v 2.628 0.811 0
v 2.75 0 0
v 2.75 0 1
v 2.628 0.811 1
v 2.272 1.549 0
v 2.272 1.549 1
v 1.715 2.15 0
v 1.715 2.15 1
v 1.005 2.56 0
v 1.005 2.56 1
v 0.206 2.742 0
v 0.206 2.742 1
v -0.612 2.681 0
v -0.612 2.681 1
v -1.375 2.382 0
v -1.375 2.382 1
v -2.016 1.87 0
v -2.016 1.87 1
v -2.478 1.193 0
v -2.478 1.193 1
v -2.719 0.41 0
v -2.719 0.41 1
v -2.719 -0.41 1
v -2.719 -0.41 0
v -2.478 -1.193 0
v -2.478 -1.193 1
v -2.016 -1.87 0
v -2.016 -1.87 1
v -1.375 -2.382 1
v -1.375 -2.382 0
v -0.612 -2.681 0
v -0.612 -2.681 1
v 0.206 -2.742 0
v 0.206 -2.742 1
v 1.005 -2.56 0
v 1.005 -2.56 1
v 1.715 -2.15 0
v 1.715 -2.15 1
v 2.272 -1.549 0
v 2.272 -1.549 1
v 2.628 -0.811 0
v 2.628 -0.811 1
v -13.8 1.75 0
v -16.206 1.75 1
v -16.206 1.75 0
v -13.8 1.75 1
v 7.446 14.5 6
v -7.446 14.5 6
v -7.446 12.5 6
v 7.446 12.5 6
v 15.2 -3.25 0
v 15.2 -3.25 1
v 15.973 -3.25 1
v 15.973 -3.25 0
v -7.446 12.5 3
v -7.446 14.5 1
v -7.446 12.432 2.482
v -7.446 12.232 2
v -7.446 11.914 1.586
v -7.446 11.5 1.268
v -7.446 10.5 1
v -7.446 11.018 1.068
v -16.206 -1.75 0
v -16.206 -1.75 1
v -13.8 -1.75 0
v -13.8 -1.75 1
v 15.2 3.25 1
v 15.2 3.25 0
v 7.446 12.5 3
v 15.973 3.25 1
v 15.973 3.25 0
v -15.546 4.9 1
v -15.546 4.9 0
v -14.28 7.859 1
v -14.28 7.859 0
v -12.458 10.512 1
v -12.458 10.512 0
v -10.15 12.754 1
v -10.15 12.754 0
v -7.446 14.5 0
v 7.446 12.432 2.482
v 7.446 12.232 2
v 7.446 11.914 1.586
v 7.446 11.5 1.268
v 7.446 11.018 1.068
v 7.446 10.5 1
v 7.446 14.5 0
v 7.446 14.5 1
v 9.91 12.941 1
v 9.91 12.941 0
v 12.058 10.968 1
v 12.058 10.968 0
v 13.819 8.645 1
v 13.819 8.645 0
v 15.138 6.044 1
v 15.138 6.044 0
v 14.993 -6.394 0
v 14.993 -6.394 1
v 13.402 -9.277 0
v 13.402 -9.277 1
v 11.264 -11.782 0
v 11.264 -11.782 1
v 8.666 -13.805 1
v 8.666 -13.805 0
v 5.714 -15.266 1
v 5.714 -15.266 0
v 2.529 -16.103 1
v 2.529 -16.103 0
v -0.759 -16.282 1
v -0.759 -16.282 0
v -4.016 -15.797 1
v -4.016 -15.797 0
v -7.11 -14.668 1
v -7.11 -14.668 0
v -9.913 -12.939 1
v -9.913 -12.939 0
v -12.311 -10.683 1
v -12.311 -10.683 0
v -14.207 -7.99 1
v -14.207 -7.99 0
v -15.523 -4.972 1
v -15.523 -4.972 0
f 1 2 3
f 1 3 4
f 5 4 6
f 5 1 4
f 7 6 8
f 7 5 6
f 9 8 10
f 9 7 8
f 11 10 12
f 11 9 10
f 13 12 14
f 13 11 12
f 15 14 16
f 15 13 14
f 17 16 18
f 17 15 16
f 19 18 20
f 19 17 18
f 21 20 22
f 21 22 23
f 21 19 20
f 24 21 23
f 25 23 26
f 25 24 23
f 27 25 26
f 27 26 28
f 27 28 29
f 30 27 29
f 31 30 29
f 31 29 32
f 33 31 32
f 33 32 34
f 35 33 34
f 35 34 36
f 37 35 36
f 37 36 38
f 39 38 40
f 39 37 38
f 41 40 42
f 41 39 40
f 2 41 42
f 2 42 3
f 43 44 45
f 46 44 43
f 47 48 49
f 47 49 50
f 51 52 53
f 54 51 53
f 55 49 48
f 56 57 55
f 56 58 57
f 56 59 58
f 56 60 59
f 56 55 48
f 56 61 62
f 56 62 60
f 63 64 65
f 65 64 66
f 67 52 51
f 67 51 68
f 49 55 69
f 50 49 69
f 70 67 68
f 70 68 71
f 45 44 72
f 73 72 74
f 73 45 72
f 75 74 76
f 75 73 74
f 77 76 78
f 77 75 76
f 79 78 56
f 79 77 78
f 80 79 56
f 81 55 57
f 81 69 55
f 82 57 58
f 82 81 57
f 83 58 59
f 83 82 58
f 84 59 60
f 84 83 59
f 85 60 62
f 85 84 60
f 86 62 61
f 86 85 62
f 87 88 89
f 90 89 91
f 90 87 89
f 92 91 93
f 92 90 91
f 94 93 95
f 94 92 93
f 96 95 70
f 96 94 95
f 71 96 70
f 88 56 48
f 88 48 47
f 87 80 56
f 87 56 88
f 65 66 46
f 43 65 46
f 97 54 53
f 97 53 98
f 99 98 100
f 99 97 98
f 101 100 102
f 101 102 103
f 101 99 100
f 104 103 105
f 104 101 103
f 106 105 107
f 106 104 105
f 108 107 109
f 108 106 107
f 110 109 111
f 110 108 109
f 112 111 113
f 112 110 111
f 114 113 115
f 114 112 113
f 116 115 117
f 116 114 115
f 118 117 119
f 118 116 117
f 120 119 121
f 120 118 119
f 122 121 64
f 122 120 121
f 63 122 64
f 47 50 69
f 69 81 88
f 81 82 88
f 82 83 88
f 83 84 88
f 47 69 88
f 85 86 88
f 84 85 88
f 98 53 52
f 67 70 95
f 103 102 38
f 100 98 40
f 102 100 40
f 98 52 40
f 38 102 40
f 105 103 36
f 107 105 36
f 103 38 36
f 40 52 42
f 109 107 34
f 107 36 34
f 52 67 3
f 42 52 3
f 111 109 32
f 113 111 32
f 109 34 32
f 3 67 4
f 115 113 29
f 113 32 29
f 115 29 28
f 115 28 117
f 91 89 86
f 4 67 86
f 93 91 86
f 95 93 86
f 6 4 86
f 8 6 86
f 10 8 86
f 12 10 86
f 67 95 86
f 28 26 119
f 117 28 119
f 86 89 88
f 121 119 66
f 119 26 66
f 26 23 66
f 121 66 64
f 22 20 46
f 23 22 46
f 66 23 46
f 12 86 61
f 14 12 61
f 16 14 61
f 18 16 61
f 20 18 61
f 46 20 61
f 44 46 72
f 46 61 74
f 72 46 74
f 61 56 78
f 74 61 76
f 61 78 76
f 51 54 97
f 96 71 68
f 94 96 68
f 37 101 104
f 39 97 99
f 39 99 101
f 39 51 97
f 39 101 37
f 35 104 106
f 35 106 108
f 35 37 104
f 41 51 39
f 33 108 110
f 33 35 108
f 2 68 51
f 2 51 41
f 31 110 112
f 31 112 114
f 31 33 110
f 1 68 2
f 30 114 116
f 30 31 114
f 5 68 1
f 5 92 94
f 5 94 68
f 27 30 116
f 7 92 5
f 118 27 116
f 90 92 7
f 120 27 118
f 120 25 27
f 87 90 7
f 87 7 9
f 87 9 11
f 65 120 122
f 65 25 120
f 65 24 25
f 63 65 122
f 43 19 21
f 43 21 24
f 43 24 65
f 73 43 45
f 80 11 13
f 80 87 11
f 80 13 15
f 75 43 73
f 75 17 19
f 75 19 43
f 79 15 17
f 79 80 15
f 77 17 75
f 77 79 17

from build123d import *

# Parameters (mm, degrees)
SKETCH_1_R          = 2.75
EXTRUDE_1_DEPTH     = 1
SKETCH_2_W          = 5
SKETCH_2_H          = 3.5
SKETCH_2_W_2        = 2
SKETCH_2_H_2        = 6.5
CUT_EXTRUDE_1_DEPTH = 2
SKETCH_3_W          = 14.891608376
SKETCH_3_H          = 2
EXTRUDE_2_DEPTH     = 5
FILLET_1_R          = 2


with BuildPart() as part:
    # 草图1 → 凸台-拉伸1 (new body)
    with BuildSketch(Plane.XY):
        with BuildLine():
            Line((-7.445804188, 14.5), (7.445804188, 14.5))
            ThreePointArc((7.445804188, 14.5), (0, -16.3), (-7.445804188, 14.5))
        make_face()
        Circle(SKETCH_1_R, mode=Mode.SUBTRACT)
    extrude(amount=EXTRUDE_1_DEPTH)

    # 草图2 → 切除-拉伸1 (cut, through all)
    with BuildSketch(Plane.XY.offset(1)):
        with Locations((-16.3, 0)):
            Rectangle(SKETCH_2_W, SKETCH_2_H)
        with Locations((16.2, 0)):
            Rectangle(SKETCH_2_W_2, SKETCH_2_H_2)
    extrude(amount=-CUT_EXTRUDE_1_DEPTH, mode=Mode.SUBTRACT)

    # 草图3 → 凸台-拉伸2 (add)
    with BuildSketch(Plane.XY.offset(1)):
        with Locations((0, 13.5)):
            Rectangle(SKETCH_3_W, SKETCH_3_H)
    extrude(amount=EXTRUDE_2_DEPTH)

    # 圆角1
    fillet_1_edges = [part.edges().sort_by_distance(p)[0] for p in [
        (0, 12.5, 1),
    ]]
    fillet(fillet_1_edges, radius=FILLET_1_R)


solid = part.part
